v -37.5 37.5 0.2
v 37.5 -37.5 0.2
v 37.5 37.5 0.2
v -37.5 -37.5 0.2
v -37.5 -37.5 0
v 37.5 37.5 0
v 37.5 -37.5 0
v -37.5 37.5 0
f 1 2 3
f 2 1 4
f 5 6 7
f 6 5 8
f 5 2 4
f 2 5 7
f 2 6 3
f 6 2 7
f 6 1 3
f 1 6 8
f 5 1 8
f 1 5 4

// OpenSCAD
$fa = 1;
$fs = 0.4;

size = 75;

translate([-(size / 2), -(size / 2), 0]) {
  cube([size, size, 0.2]);
}
